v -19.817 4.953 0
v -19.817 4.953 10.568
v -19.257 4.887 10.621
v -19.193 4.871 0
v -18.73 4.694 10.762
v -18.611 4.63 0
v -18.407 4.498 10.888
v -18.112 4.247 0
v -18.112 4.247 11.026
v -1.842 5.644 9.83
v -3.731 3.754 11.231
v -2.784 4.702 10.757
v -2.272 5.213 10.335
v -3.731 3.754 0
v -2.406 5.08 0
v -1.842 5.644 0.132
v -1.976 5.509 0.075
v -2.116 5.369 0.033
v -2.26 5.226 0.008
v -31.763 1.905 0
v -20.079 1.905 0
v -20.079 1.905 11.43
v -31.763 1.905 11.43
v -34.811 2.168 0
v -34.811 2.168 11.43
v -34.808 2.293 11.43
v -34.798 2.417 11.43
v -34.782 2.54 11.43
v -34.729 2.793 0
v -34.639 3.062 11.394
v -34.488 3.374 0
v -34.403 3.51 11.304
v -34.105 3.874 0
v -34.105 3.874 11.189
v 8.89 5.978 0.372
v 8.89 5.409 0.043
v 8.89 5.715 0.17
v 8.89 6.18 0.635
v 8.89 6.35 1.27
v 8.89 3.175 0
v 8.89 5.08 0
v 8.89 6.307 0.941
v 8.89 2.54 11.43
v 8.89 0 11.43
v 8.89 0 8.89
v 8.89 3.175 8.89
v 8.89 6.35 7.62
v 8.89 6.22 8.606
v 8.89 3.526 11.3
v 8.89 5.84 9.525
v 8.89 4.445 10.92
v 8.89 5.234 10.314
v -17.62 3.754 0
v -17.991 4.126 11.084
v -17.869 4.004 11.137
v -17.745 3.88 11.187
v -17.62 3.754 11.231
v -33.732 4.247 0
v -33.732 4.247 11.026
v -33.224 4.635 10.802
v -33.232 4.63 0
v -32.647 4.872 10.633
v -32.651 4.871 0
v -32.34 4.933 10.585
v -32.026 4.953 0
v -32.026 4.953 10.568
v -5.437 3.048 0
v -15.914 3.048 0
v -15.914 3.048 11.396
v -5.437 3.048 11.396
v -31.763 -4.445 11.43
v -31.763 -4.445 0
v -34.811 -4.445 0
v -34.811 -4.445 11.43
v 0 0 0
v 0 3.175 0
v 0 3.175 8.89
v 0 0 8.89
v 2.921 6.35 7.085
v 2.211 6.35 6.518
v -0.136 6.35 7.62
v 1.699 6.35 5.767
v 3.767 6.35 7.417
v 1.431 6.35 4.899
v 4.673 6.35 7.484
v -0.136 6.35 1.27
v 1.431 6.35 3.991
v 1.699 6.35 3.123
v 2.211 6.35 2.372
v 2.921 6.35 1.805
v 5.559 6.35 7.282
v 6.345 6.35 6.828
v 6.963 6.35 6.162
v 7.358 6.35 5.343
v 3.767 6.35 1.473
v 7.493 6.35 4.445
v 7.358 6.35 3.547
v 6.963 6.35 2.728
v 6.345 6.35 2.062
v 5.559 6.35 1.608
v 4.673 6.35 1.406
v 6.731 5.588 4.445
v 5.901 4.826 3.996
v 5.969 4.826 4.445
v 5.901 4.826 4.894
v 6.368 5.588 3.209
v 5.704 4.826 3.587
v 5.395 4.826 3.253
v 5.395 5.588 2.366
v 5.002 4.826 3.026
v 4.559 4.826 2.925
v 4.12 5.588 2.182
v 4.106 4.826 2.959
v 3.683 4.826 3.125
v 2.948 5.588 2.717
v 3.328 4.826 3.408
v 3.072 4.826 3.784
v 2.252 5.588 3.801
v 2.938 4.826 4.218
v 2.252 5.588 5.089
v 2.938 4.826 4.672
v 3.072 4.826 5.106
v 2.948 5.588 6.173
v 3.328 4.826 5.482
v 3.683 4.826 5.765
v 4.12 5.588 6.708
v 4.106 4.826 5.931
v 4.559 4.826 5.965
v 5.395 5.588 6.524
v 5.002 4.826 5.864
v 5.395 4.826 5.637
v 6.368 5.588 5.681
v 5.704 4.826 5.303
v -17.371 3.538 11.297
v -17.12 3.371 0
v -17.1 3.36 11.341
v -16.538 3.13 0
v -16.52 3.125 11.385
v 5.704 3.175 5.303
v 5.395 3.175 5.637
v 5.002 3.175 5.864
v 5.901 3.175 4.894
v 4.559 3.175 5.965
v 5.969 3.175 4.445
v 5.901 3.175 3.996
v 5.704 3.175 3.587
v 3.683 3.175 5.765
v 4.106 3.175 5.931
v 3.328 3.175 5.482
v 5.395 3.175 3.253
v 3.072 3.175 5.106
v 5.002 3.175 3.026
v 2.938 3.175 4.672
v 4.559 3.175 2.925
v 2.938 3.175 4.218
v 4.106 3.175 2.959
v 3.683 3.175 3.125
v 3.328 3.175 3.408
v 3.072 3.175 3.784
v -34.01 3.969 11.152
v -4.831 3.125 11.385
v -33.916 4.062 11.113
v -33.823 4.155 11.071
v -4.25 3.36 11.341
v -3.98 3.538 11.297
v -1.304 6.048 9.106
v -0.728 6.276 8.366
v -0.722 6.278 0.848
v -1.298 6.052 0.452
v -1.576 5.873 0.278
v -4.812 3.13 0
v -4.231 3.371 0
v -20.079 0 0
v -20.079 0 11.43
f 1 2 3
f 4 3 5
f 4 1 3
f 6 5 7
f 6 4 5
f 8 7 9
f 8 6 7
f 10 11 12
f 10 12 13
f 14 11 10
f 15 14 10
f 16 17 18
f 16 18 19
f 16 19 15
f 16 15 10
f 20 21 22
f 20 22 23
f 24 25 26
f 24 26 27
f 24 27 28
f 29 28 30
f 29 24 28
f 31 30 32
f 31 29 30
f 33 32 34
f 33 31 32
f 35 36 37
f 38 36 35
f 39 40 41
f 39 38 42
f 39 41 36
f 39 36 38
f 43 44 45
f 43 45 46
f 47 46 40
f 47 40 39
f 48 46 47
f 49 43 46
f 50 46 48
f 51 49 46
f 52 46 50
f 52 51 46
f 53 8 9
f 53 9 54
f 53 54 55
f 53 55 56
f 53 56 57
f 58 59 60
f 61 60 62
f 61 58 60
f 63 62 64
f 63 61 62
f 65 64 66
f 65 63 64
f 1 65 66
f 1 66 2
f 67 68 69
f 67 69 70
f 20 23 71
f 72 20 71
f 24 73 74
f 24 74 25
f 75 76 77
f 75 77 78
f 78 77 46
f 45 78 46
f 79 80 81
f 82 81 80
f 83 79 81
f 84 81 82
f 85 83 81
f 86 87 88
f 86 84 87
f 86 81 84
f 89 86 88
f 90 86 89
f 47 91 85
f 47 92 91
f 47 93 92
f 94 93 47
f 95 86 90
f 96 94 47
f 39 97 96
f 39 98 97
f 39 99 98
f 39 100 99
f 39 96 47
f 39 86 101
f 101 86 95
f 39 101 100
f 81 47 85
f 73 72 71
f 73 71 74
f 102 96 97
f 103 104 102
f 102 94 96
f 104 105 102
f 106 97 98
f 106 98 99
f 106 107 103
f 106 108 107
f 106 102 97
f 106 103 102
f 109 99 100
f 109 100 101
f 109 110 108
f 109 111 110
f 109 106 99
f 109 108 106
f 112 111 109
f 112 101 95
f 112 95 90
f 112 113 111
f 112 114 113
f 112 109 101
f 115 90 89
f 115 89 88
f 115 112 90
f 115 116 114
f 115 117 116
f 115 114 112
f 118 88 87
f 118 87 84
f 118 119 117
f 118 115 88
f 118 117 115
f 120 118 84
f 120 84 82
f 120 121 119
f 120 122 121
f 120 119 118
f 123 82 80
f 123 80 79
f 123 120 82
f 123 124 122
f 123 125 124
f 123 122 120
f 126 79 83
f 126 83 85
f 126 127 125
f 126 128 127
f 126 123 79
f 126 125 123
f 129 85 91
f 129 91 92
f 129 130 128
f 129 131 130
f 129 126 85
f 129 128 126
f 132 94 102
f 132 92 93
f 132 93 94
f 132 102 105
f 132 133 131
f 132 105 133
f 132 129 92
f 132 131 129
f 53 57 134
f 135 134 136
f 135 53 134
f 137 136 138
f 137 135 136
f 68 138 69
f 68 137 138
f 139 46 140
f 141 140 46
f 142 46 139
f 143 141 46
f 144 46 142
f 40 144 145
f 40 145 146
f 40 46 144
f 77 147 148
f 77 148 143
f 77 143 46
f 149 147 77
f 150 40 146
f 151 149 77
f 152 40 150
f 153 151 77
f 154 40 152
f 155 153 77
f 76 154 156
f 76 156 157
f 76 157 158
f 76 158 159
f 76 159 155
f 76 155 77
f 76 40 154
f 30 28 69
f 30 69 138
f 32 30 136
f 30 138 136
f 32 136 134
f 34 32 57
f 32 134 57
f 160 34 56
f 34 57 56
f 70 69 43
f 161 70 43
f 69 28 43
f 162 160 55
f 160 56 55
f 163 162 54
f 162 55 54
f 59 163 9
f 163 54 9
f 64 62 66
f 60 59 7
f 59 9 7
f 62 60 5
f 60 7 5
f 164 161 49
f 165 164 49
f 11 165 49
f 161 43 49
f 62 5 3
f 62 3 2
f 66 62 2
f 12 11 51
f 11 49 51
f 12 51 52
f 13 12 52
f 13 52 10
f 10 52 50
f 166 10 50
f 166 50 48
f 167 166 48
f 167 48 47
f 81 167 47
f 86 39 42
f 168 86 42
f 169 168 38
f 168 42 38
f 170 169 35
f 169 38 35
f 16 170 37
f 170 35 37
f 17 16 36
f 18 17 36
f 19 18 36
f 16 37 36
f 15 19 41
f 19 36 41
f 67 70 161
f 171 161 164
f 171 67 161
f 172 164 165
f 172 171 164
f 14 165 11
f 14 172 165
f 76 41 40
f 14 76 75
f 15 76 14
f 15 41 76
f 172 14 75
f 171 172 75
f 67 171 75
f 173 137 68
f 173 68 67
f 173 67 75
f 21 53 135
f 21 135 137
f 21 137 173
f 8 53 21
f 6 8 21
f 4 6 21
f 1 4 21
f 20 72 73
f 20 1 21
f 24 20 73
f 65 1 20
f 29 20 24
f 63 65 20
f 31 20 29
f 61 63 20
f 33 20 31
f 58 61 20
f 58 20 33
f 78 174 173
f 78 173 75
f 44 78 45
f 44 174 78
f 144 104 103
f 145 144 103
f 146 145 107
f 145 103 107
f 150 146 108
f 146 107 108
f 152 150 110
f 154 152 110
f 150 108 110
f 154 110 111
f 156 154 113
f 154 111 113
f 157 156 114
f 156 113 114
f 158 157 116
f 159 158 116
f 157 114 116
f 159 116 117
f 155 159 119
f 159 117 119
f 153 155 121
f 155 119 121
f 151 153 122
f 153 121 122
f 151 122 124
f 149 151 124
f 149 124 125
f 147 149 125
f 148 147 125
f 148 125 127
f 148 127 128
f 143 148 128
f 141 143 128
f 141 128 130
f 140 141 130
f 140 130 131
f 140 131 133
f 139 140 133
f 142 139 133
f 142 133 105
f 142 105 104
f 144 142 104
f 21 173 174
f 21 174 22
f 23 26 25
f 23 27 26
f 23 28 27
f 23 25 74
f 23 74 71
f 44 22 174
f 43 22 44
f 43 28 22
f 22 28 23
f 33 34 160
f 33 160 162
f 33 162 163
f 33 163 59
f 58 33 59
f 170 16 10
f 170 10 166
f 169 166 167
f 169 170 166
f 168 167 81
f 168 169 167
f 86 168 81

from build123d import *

# Parameters (mm, degrees)
BOSS_EXTRUDE1_DEPTH     = 11.43
SKETCH2_W               = 8.89
SKETCH2_H               = 3.175
BOSS_EXTRUDE2_DEPTH     = 2.54
SKETCH3_R               = 1.524
CUT_EXTRUDE1_DEPTH      = 11.795
CUT_EXTRUDE2_DEPTH      = 1
CUT_EXTRUDE2_DEPTH_BACK = 44.701
CHAMFER1_SIZE           = 1.524


with BuildPart() as part:
    # Sketch1 → Boss-Extrude1 (new body)
    with BuildSketch(Plane.XY):
        with BuildLine():
            Line((-20.079, 0), (-20.079, 1.905))
            Line((-20.079, 1.905), (-31.763, 1.905))
            Line((-31.763, 1.905), (-31.763, -4.445))
            Line((-31.763, -4.445), (-34.811, -4.445))
            Line((-34.811, -4.445), (-34.811, 2.168459549))
            ThreePointArc((-34.811, 2.168459549), (-34.627401057, 3.091473766), (-34.104555503, 3.873967435))
            Line((-34.104555503, 3.873967435), (-33.731967435, 4.246555503))
            ThreePointArc((-33.731967435, 4.246555503), (-32.949473766, 4.769401057), (-32.026459549, 4.953))
            Line((-32.026459549, 4.953), (-19.817153407, 4.953))
            ThreePointArc((-19.817153407, 4.953), (-18.89413919, 4.769401057), (-18.11164552, 4.246555503))
            Line((-18.11164552, 4.246555503), (-17.619534515, 3.754444497))
            ThreePointArc((-17.619534515, 3.754444497), (-16.837040845, 3.231598943), (-15.914026628, 3.048))
            Line((-15.914026628, 3.048), (-5.436586327, 3.048))
            ThreePointArc((-5.436586327, 3.048), (-4.51357211, 3.231598943), (-3.731078441, 3.754444497))
            Line((-3.731078441, 3.754444497), (-1.841967435, 5.643555503))
            ThreePointArc((-1.841967435, 5.643555503), (-1.059473766, 6.166401057), (-0.136459549, 6.35))
            Line((-0.136459549, 6.35), (8.89, 6.35))
            Line((8.89, 6.35), (8.89, 3.175))
            Line((8.89, 3.175), (0, 3.175))
            Line((0, 3.175), (0, 0))
            Line((0, 0), (-20.079, 0))
        make_face()
    extrude(amount=BOSS_EXTRUDE1_DEPTH)

    # Sketch2 → Boss-Extrude2 (add)
    with BuildSketch(Plane.XY.offset(11.43)):
        with Locations((4.445, 1.5875)):
            Rectangle(SKETCH2_W, SKETCH2_H)
    extrude(amount=-BOSS_EXTRUDE2_DEPTH)

    # Sketch3 → Cut-Extrude1 (cut, through all)
    with BuildSketch(Plane(origin=(0, 6.35, 0), x_dir=(1, 0, 0), z_dir=(0, 1, 0))):
        with Locations((4.445, -4.445)):
            Circle(SKETCH3_R)
    extrude(amount=-CUT_EXTRUDE1_DEPTH, mode=Mode.SUBTRACT)

    # Sketch4 → Cut-Extrude2 (cut, two sides)
    with BuildSketch(Plane(origin=(8.89, 0, 0), x_dir=(0, 0, -1), z_dir=(1, 0, 0))) as cut_extrude2_sk:
        with BuildLine():
            Line((-11.43, 3.175), (-11.43, 2.54))
            ThreePointArc((-11.43, 2.54), (-10.314076836, 5.234076836), (-7.62, 6.35))
            Line((-7.62, 6.35), (-11.43, 6.35))
            Line((-11.43, 6.35), (-11.43, 3.175))
        make_face()
        with BuildLine():
            Line((0, 6.35), (-1.27, 6.35))
            ThreePointArc((-1.27, 6.35), (-0.371974388, 5.978025612), (0, 5.08))
            Line((0, 5.08), (0, 6.35))
        make_face()
    extrude(amount=CUT_EXTRUDE2_DEPTH, mode=Mode.SUBTRACT)
    extrude(cut_extrude2_sk.sketch, amount=-CUT_EXTRUDE2_DEPTH_BACK, mode=Mode.SUBTRACT)

    # Chamfer1
    chamfer1_edges = [part.edges().sort_by_distance(p)[0] for p in [
        (2.921, 6.35, 4.445),
    ]]
    chamfer(chamfer1_edges, length=CHAMFER1_SIZE)


solid = part.part
